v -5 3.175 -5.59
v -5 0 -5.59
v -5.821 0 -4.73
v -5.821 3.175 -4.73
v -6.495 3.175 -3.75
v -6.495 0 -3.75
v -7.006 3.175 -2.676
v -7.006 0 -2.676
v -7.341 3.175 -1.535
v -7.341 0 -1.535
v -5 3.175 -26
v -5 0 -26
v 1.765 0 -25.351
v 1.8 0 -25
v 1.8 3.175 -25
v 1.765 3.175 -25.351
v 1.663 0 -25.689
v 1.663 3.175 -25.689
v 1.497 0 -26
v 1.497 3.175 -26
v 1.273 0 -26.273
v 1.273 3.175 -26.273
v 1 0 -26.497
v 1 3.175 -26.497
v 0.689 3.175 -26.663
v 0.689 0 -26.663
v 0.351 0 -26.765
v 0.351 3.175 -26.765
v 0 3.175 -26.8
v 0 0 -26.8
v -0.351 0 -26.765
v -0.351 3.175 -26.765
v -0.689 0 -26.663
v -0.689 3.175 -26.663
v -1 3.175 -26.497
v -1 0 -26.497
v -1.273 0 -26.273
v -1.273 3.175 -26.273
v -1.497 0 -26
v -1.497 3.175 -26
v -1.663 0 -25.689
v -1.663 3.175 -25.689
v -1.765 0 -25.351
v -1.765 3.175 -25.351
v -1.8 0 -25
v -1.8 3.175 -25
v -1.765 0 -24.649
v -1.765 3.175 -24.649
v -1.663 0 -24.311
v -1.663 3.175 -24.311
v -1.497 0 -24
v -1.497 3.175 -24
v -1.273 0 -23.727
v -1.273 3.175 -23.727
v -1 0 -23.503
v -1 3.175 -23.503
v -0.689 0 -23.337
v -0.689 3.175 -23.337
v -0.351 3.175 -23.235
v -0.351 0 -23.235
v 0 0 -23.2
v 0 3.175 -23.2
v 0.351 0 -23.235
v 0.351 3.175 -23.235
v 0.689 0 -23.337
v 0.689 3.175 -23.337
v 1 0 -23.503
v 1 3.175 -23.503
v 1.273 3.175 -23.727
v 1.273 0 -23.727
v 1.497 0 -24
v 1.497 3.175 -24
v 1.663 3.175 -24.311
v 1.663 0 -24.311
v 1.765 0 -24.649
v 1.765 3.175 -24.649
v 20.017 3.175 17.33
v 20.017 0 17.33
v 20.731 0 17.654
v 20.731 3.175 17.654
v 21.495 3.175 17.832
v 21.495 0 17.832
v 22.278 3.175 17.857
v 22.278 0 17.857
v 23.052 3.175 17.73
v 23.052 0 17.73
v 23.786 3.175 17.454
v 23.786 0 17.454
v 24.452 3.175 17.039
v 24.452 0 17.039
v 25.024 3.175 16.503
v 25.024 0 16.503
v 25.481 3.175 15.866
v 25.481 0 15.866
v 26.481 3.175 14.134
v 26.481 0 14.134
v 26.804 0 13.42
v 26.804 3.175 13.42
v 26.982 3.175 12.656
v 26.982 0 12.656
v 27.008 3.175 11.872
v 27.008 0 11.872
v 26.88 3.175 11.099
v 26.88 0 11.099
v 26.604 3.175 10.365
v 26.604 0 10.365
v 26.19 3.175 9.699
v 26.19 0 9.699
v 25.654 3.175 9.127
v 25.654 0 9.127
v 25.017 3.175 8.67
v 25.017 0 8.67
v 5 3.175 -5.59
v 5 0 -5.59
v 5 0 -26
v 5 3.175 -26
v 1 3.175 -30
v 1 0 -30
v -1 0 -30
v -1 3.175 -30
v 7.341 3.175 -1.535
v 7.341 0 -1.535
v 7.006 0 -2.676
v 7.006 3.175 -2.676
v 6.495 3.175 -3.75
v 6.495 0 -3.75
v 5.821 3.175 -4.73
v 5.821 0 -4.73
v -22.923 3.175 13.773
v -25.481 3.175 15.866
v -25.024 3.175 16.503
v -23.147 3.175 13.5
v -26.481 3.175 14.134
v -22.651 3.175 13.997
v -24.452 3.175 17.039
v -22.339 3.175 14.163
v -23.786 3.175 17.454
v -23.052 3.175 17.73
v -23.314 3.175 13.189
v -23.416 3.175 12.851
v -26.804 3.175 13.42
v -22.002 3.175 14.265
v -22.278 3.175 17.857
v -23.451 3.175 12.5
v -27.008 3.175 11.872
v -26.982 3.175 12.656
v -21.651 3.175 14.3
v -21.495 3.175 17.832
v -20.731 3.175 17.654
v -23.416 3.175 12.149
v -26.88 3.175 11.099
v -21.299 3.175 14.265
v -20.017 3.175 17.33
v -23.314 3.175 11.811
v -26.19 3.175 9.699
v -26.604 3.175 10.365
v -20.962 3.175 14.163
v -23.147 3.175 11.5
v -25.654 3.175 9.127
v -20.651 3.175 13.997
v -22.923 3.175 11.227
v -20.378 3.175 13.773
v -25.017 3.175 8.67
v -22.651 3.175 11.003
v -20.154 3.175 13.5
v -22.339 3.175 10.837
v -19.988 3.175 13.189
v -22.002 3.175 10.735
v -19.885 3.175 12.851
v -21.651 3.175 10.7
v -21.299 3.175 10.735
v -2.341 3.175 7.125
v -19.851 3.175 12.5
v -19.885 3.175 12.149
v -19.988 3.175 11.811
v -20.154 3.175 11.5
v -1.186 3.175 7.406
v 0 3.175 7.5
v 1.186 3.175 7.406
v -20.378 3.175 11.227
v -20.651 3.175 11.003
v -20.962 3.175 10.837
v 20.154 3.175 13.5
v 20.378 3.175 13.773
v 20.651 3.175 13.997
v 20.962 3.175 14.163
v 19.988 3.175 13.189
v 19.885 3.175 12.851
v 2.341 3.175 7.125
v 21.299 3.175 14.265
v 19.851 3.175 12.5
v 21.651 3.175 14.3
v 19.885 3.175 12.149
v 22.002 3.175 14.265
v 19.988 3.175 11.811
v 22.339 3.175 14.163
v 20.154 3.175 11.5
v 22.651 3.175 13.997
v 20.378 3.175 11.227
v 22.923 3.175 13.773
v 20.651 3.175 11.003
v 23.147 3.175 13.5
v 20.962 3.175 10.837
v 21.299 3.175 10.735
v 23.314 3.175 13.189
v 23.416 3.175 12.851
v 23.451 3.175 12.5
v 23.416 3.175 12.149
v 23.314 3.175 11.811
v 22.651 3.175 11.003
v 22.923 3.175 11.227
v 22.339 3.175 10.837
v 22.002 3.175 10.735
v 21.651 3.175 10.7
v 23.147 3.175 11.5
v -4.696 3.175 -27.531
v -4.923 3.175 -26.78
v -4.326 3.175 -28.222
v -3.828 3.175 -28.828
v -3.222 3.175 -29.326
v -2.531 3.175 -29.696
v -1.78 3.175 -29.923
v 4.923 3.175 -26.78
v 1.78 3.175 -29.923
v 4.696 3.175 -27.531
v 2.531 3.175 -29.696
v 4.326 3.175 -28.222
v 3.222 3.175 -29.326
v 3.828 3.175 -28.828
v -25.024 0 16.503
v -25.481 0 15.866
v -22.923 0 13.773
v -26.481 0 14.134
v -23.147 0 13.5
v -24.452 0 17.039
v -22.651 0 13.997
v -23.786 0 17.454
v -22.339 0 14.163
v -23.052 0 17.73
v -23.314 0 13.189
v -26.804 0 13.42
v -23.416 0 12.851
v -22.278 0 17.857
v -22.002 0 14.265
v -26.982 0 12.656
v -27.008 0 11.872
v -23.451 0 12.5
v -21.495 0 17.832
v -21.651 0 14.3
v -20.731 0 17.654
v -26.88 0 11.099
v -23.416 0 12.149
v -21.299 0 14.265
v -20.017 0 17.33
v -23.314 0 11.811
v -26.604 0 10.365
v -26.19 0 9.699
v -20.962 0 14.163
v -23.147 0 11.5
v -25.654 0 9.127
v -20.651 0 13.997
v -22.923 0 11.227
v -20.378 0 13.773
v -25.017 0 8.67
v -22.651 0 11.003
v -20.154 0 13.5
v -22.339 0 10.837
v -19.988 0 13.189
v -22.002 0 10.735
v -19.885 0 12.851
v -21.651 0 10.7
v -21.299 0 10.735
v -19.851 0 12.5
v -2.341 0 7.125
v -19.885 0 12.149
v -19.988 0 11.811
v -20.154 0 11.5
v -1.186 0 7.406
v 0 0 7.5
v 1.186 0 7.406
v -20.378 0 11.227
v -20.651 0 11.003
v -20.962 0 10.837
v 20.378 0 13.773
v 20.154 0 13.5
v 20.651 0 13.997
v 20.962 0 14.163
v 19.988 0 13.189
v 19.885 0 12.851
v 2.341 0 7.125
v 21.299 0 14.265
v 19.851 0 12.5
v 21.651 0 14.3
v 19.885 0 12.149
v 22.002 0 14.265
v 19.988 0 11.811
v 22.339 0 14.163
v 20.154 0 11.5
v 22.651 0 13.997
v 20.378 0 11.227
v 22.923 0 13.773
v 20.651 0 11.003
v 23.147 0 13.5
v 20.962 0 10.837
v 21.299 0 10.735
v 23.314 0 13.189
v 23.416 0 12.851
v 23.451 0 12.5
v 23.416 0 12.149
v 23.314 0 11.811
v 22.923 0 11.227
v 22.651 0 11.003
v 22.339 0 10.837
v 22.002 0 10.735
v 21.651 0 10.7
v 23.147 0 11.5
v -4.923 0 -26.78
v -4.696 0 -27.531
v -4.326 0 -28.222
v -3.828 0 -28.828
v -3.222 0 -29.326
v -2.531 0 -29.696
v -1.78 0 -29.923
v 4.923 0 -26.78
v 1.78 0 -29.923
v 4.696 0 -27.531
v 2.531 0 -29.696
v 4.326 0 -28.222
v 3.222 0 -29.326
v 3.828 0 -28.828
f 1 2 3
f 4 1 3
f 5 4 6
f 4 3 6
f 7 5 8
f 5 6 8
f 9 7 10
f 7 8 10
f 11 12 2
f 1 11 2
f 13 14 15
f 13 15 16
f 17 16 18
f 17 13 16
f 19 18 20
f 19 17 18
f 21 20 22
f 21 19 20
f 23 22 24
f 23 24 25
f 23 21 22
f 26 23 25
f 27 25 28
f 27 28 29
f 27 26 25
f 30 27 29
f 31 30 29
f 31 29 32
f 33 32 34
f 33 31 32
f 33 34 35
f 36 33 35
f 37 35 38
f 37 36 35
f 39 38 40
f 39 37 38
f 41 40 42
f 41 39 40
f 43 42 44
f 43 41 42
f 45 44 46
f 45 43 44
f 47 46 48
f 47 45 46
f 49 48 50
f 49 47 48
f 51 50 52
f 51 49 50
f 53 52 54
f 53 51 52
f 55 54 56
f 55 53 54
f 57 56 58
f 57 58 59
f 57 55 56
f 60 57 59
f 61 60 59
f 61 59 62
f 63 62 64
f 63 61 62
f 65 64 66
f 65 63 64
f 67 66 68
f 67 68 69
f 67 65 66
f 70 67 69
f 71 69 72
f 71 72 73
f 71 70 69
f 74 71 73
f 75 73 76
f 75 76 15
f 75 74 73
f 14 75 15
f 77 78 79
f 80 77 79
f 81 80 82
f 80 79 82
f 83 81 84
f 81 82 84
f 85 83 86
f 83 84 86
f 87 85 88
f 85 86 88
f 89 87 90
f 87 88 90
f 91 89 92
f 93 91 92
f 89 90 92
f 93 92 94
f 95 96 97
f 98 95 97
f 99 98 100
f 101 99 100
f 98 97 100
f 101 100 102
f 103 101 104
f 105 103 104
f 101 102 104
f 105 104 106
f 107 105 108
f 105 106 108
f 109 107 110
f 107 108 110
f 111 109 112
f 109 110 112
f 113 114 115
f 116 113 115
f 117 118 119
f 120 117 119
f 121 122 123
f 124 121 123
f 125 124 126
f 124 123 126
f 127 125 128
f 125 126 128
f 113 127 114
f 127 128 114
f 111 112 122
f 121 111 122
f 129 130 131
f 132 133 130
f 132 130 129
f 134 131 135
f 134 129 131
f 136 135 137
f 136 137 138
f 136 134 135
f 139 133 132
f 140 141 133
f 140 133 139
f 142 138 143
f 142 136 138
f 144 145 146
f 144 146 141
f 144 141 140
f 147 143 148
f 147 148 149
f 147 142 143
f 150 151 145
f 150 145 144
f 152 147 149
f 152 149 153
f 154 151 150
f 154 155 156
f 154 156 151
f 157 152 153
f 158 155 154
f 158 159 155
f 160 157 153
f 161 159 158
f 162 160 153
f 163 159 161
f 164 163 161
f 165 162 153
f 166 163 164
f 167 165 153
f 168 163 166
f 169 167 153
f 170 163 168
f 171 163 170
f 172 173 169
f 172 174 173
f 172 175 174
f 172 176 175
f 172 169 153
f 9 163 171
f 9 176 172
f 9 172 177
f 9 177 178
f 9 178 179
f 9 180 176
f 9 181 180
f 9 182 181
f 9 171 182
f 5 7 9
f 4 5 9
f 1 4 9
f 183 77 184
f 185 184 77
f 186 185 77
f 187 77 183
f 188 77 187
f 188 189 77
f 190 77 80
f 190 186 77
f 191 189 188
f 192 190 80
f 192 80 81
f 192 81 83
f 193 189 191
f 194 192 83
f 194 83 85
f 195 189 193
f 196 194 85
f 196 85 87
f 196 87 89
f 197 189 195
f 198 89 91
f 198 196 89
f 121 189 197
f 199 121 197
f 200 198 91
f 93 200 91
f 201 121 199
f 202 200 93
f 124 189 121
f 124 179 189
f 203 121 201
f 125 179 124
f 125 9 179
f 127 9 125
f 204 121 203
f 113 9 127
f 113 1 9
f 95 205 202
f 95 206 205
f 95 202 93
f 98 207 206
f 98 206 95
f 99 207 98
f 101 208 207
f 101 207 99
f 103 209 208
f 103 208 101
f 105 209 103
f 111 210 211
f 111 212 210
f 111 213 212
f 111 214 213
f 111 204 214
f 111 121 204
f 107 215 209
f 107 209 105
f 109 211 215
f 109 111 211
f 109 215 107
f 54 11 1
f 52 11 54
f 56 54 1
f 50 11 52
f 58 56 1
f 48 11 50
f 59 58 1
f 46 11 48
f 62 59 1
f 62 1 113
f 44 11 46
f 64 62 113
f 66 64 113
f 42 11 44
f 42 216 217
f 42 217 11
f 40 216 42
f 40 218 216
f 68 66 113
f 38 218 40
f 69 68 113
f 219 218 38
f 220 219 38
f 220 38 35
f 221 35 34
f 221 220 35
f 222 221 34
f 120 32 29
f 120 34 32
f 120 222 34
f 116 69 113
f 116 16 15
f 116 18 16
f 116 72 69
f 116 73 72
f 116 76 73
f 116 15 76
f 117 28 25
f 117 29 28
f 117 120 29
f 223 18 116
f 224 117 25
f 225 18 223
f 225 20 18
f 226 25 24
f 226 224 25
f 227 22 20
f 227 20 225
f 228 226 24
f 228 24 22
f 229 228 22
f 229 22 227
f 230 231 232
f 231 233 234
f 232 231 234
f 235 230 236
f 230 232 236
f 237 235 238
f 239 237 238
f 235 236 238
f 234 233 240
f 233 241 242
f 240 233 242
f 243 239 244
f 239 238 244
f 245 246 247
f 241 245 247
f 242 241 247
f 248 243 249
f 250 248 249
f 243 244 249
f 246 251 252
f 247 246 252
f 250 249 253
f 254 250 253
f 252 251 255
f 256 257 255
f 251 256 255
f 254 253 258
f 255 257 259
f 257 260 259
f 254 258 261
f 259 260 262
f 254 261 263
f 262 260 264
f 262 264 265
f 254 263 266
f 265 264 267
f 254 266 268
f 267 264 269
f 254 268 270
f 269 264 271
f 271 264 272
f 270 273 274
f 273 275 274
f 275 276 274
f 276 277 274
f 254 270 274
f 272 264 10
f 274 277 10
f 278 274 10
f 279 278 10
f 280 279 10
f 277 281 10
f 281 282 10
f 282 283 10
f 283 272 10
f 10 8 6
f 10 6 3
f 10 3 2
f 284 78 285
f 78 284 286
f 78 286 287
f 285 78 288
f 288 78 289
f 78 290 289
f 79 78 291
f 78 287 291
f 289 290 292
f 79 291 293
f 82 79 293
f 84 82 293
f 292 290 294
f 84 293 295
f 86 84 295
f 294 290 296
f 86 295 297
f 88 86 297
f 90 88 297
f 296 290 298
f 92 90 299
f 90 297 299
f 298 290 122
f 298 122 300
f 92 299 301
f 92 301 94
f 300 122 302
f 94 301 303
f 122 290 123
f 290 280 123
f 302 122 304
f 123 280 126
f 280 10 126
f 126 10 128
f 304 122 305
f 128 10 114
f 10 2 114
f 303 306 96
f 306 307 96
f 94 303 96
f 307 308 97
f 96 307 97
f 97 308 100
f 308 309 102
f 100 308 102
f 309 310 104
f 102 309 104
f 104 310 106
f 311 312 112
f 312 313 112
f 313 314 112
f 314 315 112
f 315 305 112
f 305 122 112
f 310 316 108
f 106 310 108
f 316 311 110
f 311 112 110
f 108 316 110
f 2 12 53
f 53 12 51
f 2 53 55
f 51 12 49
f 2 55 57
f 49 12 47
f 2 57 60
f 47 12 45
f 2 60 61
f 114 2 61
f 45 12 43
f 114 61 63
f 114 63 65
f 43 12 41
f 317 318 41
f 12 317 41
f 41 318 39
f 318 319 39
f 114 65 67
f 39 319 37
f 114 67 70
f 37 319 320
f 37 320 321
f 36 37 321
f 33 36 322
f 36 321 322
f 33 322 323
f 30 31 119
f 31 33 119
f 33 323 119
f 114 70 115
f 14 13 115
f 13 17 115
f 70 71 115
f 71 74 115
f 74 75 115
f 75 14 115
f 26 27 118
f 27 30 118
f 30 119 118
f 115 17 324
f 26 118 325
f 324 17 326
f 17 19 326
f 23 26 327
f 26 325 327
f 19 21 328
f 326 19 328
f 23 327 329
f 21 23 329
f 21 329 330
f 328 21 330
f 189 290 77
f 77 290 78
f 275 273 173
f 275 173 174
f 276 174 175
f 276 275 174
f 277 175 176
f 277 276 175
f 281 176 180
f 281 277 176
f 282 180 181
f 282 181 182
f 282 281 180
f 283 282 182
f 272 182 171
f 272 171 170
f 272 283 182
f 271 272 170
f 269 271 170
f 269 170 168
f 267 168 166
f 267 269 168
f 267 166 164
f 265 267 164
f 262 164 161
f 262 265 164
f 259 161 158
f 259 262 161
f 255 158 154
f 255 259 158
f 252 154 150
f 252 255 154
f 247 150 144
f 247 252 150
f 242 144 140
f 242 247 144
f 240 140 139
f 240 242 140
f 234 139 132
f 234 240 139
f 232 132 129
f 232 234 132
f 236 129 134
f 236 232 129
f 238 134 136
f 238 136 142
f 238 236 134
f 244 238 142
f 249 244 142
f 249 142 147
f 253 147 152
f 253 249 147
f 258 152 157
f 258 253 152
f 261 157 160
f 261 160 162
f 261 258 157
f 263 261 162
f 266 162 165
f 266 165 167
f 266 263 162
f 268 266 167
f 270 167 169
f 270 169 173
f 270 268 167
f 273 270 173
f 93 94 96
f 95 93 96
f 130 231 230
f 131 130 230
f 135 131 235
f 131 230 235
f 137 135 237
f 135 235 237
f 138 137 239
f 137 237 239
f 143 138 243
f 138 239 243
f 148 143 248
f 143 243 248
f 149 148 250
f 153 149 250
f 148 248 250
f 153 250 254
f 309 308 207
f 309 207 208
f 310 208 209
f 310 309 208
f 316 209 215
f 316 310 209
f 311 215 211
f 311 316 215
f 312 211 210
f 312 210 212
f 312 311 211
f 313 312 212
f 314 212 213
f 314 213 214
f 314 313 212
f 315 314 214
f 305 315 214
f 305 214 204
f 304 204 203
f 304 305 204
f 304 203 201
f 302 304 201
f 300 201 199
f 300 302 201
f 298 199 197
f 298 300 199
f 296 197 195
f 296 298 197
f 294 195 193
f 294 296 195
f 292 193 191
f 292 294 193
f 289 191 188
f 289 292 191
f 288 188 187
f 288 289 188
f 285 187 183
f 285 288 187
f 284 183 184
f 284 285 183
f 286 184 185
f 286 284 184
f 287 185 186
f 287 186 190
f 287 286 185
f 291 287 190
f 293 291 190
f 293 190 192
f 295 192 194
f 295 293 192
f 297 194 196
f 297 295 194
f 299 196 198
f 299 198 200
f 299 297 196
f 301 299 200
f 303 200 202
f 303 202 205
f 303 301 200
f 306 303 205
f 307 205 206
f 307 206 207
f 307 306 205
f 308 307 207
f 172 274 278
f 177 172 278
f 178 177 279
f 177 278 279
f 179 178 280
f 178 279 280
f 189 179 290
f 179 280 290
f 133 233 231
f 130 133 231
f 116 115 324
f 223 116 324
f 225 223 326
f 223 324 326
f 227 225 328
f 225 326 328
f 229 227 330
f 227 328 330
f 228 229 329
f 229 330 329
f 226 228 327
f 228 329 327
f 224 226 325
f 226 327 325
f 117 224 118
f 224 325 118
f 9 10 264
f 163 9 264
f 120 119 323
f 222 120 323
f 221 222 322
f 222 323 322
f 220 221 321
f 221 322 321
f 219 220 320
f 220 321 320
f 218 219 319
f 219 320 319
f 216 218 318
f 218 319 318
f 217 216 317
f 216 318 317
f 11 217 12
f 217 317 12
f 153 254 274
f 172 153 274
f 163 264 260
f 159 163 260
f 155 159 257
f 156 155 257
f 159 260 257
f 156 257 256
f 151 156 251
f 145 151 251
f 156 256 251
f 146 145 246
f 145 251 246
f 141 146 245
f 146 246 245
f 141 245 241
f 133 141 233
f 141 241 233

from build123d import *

# Parameters (mm, degrees)
SKETCH1_R           = 7.5
SKETCH1_R_2         = 5
SKETCH1_R_3         = 1.8
BOSS_EXTRUDE1_DEPTH = 3.175


with BuildPart() as part:
    # Sketch1 → Boss-Extrude1 (new body)
    with BuildSketch(Plane(origin=(0, 0, 0), x_dir=(1, 0, 0), z_dir=(0, 1, 0))):
        Circle(SKETCH1_R)
        Circle(SKETCH1_R_2, mode=Mode.SUBTRACT)
        with BuildLine():
            Line((2.5, 4.330127019), (-2.5, -4.330127019))
            Line((-2.5, -4.330127019), (20.016660498, -17.330127019))
            ThreePointArc((20.016660498, -17.330127019), (23.051936679, -17.729728709), (25.480762114, -15.866025404))
            Line((25.480762114, -15.866025404), (26.480762114, -14.133974596))
            ThreePointArc((26.480762114, -14.133974596), (26.880363804, -11.098698416), (25.016660498, -8.669872981))
            Line((25.016660498, -8.669872981), (2.5, 4.330127019))
        make_face()
        with Locations((21.650635095, -12.5)):
            Circle(SKETCH1_R_3, mode=Mode.SUBTRACT)
        with BuildLine():
            Line((-5, 0), (5, 0))
            Line((5, 0), (5, 26))
            ThreePointArc((5, 26), (3.828427125, 28.828427125), (1, 30))
            Line((1, 30), (-1, 30))
            ThreePointArc((-1, 30), (-3.828427125, 28.828427125), (-5, 26))
            Line((-5, 26), (-5, 0))
        make_face()
        with Locations((0, 25)):
            Circle(SKETCH1_R_3, mode=Mode.SUBTRACT)
        with BuildLine():
            Line((2.5, -4.330127019), (-2.5, 4.330127019))
            Line((-2.5, 4.330127019), (-25.016660498, -8.669872981))
            ThreePointArc((-25.016660498, -8.669872981), (-26.880363804, -11.098698416), (-26.480762114, -14.133974596))
            Line((-26.480762114, -14.133974596), (-25.480762114, -15.866025404))
            ThreePointArc((-25.480762114, -15.866025404), (-23.051936679, -17.729728709), (-20.016660498, -17.330127019))
            Line((-20.016660498, -17.330127019), (2.5, -4.330127019))
        make_face()
        with Locations((-21.650635095, -12.5)):
            Circle(SKETCH1_R_3, mode=Mode.SUBTRACT)
    extrude(amount=BOSS_EXTRUDE1_DEPTH)


solid = part.part
